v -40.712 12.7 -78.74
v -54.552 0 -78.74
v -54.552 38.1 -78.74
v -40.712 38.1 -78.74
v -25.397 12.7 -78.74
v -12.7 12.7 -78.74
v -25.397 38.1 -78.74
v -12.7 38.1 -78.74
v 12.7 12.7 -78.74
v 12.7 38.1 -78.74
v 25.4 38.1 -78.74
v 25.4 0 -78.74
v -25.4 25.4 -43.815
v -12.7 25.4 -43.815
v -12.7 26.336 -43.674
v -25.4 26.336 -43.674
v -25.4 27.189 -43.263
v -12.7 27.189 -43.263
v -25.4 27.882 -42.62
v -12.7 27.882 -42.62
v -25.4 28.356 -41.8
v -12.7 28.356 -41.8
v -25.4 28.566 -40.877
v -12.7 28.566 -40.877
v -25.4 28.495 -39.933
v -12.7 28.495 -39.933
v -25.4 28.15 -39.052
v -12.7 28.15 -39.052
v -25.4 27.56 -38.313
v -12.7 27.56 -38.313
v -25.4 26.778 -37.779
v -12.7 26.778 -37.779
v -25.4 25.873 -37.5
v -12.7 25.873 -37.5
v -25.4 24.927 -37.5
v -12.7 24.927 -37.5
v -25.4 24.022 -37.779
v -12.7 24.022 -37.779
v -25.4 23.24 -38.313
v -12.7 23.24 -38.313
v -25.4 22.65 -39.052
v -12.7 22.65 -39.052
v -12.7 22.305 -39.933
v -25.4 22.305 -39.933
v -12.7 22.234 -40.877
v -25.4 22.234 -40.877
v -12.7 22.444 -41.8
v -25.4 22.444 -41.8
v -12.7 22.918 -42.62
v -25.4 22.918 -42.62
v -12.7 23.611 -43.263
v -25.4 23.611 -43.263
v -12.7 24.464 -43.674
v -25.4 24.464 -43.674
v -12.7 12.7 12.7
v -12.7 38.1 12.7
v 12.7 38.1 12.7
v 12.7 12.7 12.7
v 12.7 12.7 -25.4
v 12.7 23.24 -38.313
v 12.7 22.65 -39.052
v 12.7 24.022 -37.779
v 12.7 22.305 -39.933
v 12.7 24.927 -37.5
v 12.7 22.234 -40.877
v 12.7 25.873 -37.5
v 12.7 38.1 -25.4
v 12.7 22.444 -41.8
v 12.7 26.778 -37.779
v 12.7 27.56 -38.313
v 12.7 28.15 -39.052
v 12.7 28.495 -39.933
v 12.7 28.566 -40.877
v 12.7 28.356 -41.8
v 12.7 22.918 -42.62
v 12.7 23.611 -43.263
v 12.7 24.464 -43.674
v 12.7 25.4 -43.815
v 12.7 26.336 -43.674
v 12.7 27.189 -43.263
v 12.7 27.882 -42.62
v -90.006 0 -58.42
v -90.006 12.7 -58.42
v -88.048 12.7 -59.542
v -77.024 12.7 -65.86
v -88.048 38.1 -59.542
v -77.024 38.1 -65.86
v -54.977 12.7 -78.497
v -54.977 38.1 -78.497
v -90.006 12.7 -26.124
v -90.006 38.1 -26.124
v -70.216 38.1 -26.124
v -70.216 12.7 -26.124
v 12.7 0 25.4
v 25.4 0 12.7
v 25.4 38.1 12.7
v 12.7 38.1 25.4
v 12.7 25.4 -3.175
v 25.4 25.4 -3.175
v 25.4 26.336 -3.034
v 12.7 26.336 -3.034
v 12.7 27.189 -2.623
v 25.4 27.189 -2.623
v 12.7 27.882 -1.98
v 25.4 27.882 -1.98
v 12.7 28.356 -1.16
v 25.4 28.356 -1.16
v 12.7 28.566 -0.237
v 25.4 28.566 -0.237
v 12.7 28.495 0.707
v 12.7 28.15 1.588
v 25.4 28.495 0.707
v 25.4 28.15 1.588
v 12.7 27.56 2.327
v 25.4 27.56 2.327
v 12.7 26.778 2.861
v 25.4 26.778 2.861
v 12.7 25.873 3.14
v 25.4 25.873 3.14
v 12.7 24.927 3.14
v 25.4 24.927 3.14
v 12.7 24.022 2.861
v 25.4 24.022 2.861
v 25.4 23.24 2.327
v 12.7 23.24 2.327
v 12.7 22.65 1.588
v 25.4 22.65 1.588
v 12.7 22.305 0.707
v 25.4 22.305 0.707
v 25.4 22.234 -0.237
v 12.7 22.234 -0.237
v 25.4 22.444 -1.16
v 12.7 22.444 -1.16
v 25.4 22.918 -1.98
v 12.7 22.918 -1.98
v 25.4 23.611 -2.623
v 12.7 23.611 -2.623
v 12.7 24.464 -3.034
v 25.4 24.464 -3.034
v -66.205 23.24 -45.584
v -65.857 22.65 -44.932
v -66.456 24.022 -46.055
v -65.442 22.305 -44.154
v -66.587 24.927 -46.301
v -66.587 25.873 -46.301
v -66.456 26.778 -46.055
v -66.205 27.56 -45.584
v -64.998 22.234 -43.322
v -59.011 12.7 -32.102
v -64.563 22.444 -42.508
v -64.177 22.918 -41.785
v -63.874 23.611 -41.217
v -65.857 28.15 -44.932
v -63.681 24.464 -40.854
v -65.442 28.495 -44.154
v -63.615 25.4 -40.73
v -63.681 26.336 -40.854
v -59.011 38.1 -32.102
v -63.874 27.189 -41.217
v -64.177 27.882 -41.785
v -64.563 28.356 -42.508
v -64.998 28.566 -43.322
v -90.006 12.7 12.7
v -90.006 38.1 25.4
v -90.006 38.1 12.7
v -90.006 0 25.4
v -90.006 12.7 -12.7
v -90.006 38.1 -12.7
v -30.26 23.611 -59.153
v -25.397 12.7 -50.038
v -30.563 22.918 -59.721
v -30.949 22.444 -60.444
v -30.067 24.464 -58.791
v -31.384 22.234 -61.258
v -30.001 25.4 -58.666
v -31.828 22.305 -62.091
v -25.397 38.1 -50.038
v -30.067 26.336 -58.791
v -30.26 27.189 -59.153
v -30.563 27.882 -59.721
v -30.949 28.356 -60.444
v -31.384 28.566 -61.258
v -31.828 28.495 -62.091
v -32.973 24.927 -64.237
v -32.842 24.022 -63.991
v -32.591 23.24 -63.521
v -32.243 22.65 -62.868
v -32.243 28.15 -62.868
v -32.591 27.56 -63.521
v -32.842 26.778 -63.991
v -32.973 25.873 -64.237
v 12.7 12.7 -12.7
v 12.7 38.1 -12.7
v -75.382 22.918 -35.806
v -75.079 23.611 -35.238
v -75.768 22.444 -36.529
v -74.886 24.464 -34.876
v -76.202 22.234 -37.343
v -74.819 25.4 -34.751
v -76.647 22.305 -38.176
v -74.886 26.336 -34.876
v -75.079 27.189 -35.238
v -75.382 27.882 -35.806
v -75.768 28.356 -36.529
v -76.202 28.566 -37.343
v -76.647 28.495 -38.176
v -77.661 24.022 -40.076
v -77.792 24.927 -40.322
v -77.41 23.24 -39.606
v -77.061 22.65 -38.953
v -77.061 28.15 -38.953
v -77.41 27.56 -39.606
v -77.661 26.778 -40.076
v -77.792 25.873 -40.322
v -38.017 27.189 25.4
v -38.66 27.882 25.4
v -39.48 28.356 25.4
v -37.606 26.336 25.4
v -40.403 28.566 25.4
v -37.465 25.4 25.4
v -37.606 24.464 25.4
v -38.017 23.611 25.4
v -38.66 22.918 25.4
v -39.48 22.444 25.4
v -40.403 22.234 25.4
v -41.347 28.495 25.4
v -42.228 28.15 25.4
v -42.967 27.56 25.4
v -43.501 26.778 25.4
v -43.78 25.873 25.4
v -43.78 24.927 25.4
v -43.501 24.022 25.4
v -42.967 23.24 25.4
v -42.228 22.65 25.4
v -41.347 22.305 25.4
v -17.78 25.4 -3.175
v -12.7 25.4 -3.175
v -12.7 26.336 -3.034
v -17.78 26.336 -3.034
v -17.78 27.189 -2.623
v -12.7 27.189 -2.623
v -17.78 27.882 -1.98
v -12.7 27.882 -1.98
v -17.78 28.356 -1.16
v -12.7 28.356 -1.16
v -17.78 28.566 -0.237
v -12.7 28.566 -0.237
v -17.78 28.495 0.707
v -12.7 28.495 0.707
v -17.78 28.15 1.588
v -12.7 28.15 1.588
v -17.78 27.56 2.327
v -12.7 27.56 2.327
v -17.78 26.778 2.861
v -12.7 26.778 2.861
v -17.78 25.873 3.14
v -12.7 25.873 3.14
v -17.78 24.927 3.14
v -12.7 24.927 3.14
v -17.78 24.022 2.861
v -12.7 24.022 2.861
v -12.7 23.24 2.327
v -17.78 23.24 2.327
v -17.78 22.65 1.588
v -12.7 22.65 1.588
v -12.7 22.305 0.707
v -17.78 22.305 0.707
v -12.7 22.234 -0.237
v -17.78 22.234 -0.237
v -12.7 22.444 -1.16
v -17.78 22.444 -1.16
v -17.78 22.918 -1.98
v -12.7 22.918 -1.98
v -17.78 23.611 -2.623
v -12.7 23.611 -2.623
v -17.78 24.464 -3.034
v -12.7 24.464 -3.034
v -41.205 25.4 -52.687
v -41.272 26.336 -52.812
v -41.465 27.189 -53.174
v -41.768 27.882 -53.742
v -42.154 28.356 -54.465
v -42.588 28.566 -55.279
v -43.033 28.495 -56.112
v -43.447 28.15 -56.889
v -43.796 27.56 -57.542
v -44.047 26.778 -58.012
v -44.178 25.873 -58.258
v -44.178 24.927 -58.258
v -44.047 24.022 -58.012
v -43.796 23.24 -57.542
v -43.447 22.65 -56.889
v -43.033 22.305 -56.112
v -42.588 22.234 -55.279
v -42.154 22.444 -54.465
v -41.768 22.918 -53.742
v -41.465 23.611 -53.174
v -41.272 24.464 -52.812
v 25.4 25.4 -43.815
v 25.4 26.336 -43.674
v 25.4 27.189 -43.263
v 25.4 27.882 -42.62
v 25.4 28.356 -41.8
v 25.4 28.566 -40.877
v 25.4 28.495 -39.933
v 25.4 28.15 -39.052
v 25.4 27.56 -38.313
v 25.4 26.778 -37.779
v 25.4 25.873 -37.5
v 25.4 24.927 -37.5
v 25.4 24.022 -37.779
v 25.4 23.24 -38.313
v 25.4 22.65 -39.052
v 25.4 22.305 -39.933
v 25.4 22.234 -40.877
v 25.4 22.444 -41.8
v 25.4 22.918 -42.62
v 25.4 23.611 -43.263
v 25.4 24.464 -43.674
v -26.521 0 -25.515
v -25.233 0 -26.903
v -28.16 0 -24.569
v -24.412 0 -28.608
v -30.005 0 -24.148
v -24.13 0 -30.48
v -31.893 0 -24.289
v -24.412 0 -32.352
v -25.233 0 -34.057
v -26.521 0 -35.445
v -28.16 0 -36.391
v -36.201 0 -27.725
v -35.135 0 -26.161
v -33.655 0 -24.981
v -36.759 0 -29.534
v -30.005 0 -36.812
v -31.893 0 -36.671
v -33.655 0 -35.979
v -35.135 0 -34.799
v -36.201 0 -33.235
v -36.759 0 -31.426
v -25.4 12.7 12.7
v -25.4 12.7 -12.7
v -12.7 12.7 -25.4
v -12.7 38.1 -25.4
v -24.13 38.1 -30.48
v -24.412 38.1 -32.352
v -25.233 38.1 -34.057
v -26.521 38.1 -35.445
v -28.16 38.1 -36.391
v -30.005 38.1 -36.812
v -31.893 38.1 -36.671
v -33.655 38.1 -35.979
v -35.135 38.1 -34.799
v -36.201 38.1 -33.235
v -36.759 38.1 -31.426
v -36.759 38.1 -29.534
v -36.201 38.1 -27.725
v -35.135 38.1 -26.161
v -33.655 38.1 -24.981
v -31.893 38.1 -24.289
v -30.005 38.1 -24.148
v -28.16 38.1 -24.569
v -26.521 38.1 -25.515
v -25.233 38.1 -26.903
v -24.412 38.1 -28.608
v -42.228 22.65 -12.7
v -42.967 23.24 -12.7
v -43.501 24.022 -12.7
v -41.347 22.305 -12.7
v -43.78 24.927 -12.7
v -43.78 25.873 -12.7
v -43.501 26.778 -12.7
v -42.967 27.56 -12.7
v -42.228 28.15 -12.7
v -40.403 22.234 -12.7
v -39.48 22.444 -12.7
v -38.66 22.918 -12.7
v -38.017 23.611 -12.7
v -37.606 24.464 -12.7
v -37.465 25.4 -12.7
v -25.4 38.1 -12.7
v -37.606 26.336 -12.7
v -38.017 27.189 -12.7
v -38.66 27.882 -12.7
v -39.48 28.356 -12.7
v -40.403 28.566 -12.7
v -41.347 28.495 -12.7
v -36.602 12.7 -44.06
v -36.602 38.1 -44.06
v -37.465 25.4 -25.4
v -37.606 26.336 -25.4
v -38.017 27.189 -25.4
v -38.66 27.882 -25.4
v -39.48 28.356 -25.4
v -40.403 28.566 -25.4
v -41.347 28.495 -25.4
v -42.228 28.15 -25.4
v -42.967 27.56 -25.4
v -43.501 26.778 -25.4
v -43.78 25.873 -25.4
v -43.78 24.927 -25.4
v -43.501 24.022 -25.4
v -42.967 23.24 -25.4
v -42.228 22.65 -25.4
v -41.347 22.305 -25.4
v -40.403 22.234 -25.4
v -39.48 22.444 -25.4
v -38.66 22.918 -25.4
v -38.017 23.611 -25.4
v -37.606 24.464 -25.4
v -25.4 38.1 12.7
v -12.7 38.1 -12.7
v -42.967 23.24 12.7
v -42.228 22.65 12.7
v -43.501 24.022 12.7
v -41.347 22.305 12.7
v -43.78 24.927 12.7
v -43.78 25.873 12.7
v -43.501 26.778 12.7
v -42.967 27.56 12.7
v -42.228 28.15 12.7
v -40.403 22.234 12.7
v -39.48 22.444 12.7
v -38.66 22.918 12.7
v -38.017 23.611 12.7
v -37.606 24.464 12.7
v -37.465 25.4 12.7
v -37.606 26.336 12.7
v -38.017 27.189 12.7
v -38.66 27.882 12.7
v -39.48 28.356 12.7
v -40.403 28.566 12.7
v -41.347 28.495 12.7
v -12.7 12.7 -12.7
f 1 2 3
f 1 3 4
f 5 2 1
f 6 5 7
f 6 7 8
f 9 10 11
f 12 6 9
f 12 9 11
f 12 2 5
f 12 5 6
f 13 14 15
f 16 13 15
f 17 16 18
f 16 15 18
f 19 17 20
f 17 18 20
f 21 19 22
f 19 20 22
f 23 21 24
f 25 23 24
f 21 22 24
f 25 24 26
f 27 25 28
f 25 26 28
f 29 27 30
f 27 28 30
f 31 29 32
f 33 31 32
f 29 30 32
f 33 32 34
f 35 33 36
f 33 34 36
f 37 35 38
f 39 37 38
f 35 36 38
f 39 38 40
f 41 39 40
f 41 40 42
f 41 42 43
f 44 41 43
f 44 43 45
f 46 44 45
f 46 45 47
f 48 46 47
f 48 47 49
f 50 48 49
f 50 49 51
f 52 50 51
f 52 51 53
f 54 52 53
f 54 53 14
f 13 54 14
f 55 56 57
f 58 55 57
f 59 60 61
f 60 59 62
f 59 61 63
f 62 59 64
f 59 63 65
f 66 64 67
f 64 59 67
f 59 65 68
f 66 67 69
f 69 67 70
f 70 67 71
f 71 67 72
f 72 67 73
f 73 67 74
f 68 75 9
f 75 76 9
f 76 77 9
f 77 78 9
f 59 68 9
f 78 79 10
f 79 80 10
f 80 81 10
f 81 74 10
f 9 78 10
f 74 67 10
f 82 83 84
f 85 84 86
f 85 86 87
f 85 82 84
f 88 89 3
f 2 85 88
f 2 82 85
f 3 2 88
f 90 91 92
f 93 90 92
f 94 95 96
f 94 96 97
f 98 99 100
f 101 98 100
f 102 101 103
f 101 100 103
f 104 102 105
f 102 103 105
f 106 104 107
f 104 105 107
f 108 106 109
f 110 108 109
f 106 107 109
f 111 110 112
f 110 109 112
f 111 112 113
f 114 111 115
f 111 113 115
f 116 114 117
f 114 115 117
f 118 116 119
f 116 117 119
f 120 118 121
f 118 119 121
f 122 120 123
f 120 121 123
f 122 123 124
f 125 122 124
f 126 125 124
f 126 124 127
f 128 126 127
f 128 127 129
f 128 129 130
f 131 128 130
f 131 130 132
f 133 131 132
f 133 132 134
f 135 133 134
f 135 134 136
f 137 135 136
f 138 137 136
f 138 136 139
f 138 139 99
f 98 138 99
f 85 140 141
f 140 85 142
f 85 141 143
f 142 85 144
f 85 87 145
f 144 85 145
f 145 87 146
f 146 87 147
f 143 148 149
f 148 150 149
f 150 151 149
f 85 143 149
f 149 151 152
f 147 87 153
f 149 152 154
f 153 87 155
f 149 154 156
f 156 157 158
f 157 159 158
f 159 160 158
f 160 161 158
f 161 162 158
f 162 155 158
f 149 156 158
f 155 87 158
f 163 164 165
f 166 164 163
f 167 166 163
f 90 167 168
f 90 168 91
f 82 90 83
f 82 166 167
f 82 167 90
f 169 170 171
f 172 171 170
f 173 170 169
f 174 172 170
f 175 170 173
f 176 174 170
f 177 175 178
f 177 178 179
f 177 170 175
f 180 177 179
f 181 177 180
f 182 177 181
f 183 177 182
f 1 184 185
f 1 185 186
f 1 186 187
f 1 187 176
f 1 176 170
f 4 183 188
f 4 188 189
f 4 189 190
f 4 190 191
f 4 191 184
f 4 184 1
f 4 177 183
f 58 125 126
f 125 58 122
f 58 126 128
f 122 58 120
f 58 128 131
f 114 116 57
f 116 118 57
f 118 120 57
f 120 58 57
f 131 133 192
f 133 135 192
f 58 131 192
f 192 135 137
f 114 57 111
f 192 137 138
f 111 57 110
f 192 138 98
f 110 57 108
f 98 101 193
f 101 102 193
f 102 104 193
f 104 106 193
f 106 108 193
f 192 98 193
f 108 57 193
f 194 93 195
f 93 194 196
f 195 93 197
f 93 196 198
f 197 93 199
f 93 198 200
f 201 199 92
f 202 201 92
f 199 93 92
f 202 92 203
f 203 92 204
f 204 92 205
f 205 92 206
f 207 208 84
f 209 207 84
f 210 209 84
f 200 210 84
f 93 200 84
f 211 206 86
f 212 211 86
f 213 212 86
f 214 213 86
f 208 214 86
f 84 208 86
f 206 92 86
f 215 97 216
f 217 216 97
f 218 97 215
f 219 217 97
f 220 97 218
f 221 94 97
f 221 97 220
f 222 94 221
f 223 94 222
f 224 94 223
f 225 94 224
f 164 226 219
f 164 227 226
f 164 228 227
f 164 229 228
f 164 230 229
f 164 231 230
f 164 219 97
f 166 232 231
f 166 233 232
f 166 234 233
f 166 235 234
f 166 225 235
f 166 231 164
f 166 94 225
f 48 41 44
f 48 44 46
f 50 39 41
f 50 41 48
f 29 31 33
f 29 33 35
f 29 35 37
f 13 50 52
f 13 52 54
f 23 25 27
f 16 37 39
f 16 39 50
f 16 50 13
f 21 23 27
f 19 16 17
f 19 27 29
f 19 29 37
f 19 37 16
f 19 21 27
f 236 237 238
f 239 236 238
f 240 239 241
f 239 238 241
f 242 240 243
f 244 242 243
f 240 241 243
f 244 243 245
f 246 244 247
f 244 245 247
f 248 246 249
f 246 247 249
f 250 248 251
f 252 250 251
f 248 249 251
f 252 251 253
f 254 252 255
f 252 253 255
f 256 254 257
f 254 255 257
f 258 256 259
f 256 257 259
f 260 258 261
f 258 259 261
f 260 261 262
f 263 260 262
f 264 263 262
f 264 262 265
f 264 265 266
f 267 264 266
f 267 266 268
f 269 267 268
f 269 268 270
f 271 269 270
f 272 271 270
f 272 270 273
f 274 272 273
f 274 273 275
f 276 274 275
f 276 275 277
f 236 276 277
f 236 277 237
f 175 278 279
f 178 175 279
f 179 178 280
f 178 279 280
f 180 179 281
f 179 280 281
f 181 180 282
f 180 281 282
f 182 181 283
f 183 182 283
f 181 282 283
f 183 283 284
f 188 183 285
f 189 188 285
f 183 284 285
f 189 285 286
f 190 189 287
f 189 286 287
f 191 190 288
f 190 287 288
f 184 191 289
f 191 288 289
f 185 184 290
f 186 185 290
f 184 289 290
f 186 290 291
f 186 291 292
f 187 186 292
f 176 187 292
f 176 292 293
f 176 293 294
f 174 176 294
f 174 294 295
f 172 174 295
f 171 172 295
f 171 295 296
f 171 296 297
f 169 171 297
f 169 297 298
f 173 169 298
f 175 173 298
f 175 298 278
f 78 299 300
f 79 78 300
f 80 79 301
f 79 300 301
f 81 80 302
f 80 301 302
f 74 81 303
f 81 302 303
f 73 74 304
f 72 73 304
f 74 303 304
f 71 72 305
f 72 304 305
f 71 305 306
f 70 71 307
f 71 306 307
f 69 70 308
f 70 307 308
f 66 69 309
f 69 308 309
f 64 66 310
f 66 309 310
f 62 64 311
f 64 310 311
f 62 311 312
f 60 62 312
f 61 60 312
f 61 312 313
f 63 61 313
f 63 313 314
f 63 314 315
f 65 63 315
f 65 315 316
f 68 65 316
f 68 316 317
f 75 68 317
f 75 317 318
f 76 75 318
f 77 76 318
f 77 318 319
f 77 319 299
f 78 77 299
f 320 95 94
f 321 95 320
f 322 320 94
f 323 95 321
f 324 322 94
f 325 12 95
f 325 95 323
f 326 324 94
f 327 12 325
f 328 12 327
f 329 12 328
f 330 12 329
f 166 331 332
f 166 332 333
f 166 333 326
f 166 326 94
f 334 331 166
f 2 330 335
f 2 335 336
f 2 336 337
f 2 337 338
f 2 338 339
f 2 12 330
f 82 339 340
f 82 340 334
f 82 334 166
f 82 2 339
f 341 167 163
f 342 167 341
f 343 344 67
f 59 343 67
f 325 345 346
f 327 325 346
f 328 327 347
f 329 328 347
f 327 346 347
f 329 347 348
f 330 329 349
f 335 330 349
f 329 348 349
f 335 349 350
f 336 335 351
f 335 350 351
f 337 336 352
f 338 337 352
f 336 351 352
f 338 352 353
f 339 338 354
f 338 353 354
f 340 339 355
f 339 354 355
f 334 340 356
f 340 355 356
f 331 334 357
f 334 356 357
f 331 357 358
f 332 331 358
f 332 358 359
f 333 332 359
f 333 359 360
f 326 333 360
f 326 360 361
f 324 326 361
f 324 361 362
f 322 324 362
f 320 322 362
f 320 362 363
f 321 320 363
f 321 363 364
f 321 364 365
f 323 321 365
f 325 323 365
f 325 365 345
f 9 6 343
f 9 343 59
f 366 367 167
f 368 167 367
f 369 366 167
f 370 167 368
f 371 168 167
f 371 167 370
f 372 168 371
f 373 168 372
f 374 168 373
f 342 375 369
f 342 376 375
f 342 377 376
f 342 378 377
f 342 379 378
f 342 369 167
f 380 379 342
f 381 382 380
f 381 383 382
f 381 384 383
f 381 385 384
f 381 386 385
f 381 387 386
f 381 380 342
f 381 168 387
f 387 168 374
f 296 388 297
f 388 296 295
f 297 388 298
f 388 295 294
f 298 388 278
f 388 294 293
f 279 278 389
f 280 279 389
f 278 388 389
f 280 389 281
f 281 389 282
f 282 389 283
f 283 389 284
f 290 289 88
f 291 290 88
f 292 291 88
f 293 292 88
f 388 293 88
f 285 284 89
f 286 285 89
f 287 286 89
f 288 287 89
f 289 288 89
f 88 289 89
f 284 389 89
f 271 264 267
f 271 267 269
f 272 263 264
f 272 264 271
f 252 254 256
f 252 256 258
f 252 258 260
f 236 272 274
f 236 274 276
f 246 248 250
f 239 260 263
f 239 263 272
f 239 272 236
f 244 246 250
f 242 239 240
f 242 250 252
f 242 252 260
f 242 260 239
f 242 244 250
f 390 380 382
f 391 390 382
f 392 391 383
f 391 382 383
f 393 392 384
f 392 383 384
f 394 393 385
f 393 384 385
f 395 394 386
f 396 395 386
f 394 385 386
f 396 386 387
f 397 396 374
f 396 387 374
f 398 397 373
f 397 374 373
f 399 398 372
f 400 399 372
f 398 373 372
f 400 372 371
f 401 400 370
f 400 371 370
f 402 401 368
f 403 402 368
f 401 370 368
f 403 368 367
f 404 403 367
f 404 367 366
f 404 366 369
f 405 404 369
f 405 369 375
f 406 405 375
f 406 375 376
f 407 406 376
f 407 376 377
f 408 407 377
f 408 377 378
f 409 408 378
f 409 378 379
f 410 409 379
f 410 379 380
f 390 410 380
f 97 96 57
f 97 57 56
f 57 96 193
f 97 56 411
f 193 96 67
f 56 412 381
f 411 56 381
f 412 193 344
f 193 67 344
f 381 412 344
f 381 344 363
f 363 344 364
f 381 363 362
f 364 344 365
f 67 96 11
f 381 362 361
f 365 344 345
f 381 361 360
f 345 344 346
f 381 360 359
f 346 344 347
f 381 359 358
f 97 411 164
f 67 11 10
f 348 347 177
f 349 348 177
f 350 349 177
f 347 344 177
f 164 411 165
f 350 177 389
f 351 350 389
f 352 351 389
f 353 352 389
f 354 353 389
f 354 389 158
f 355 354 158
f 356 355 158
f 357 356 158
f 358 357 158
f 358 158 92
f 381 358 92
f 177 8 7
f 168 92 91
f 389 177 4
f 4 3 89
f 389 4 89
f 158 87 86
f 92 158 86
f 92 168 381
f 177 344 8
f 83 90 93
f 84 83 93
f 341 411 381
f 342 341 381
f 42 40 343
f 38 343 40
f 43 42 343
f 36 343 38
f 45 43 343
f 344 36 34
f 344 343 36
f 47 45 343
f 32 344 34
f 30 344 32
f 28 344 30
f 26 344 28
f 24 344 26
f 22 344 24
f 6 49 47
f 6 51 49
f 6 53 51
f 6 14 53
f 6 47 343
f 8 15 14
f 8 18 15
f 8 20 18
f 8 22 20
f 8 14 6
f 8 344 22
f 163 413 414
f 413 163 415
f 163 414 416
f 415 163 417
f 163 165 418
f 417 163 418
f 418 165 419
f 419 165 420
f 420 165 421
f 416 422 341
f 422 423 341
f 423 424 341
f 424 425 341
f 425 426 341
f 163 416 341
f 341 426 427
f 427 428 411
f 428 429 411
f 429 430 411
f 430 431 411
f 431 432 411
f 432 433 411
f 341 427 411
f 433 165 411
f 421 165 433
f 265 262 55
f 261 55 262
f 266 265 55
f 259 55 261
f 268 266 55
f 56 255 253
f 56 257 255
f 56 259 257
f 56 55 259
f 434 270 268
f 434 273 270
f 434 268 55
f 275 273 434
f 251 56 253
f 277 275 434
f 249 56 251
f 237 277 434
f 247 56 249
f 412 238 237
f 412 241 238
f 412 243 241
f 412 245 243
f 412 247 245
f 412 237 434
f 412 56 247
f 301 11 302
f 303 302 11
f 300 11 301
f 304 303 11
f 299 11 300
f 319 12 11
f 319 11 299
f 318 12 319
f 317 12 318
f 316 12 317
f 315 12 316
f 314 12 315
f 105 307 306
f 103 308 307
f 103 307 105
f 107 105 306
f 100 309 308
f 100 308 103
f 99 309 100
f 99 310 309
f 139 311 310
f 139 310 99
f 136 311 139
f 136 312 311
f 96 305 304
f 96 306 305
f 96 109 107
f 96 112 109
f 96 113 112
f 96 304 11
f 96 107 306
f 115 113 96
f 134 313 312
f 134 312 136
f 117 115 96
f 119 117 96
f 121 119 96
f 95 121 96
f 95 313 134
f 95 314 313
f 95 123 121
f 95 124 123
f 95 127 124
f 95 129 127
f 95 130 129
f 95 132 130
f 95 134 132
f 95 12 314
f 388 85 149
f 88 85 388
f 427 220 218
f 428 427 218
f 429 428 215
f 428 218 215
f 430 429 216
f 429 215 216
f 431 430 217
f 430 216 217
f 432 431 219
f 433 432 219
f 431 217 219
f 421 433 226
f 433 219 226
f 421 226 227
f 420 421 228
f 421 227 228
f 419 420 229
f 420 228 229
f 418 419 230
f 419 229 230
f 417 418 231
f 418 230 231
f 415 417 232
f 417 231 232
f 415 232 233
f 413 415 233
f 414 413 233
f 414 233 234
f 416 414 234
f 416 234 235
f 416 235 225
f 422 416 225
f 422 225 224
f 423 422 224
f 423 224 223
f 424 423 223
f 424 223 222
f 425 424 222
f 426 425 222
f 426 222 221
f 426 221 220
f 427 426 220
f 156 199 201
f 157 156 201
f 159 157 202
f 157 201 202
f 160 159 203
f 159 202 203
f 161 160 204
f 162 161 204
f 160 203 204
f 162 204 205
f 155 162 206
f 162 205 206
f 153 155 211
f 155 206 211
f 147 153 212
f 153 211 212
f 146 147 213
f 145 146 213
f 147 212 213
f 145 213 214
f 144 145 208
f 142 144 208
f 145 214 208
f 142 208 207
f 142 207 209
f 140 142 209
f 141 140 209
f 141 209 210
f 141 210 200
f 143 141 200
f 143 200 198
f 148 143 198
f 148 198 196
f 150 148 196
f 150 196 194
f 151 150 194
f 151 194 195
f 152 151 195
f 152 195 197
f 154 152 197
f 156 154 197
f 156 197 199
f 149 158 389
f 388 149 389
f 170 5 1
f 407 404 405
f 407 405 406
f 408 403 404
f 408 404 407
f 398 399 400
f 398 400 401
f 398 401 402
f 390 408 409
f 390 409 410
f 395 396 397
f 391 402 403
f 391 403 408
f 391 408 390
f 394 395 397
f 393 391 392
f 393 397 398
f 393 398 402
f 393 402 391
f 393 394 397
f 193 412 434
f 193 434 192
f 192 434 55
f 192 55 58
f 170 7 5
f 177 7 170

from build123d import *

# Parameters (mm, degrees)
SALIENTE_EXTRUIR1_DEPTH = 38.1
CROQUIS2_W              = 25.4
CROQUIS2_H              = 25.4
CORTAR_EXTRUIR1_DEPTH   = 25.4
CROQUIS3_W              = 64.605839452
CROQUIS3_H              = 25.4
CORTAR_EXTRUIR2_DEPTH   = 25.4
CROQUIS4_W              = 25.4
CROQUIS4_H              = 53.34
CORTAR_EXTRUIR3_DEPTH   = 25.4
CORTAR_EXTRUIR4_DEPTH   = 25.4
CORTAR_EXTRUIR5_DEPTH   = 25.4
CROQUIS7_R              = 3.175
CORTAR_EXTRUIR6_DEPTH   = 50.8
CROQUIS8_R              = 3.175
CORTAR_EXTRUIR7_DEPTH   = 50.8
CROQUIS10_R             = 3.175
CORTAR_EXTRUIR9_DEPTH   = 43.18
CROQUIS11_R             = 3.175
CORTAR_EXTRUIR10_DEPTH  = 50.8
SKETCH1_R               = 6.35
CUT_EXTRUDE1_DEPTH      = 39.1


with BuildPart() as part:
    # Croquis1 → Saliente-Extruir1 (new body)
    with BuildSketch(Plane(origin=(0, 0, 0), x_dir=(1, 0, 0), z_dir=(0, 1, 0))):
        Polygon((25.4, 78.74), (25.4, -12.7), (12.7, -25.4), (-90.005839452, -25.4), (-90.005839452, 58.42), (-54.552420926, 78.74), align=None)
    extrude(amount=SALIENTE_EXTRUIR1_DEPTH)

    # Croquis2 → Cortar-Extruir1 (cut)
    with BuildSketch(Plane(origin=(0, 38.1, 0), x_dir=(1, 0, 0), z_dir=(0, 1, 0))):
        Rectangle(CROQUIS2_W, CROQUIS2_H)
    extrude(amount=-CORTAR_EXTRUIR1_DEPTH, mode=Mode.SUBTRACT)

    # Croquis3 → Cortar-Extruir2 (cut)
    with BuildSketch(Plane(origin=(0, 38.1, 0), x_dir=(1, 0, 0), z_dir=(0, 1, 0))):
        with Locations((-57.702919726, 0)):
            Rectangle(CROQUIS3_W, CROQUIS3_H)
    extrude(amount=-CORTAR_EXTRUIR2_DEPTH, mode=Mode.SUBTRACT)

    # Croquis4 → Cortar-Extruir3 (cut)
    with BuildSketch(Plane(origin=(0, 38.1, 0), x_dir=(1, 0, 0), z_dir=(0, 1, 0))):
        with Locations((0, 52.07)):
            Rectangle(CROQUIS4_W, CROQUIS4_H)
    extrude(amount=-CORTAR_EXTRUIR3_DEPTH, mode=Mode.SUBTRACT)

    # Croquis5 → Cortar-Extruir4 (cut)
    with BuildSketch(Plane(origin=(0, 38.1, 0), x_dir=(1, 0, 0), z_dir=(0, 1, 0))):
        Polygon((-59.011096598, 32.102249098), (-36.601753481, 44.059729647), (-54.977056362, 78.496621719), (-77.024213035, 65.860372741), align=None)
    extrude(amount=-CORTAR_EXTRUIR4_DEPTH, mode=Mode.SUBTRACT)

    # Croquis6 → Cortar-Extruir5 (cut)
    with BuildSketch(Plane(origin=(0, 38.1, 0), x_dir=(1, 0, 0), z_dir=(0, 1, 0))):
        Polygon((-25.397081923, 50.038469922), (-40.712032739, 78.74), (-25.397081923, 78.74), align=None)
        Polygon((-70.215768156, 26.123508824), (-88.047791372, 59.542248253), (-90.005839452, 58.42), (-90.005839452, 26.123508824), align=None)
    extrude(amount=-CORTAR_EXTRUIR5_DEPTH, mode=Mode.SUBTRACT)

    # Croquis7 → Cortar-Extruir6 (cut)
    with BuildSketch(Plane.XY.offset(25.4)):
        with Locations((-40.64, 25.4)):
            Circle(CROQUIS7_R)
    extrude(amount=-CORTAR_EXTRUIR6_DEPTH, mode=Mode.SUBTRACT)

    # Croquis8 → Cortar-Extruir7 (cut)
    with BuildSketch(Plane(origin=(25.4, 0, 0), x_dir=(0, 0, -1), z_dir=(1, 0, 0))):
        with Locations((40.64, 25.4)):
            Circle(CROQUIS8_R)
    extrude(amount=-CORTAR_EXTRUIR7_DEPTH, mode=Mode.SUBTRACT)

    # Croquis10 → Cortar-Extruir9 (cut)
    with BuildSketch(Plane(origin=(25.4, 0, 0), x_dir=(0, 0, -1), z_dir=(1, 0, 0))):
        with Locations((0, 25.4)):
            Circle(CROQUIS10_R)
    extrude(amount=-CORTAR_EXTRUIR9_DEPTH, mode=Mode.SUBTRACT)

    # Croquis11 → Cortar-Extruir10 (cut)
    with BuildSketch(Plane(origin=(-43.804364121, 0, 23.373725379), x_dir=(0.470766951, 0, 0.882257603), z_dir=(-0.882257603, 0, 0.470766951))):
        with Locations((-69.056927347, 25.4)):
            Circle(CROQUIS11_R)
    extrude(amount=-CORTAR_EXTRUIR10_DEPTH, mode=Mode.SUBTRACT)

    # Sketch1 → Cut-Extrude1 (cut, through all)
    with BuildSketch(Plane(origin=(0, 38.1, 0), x_dir=(1, 0, 0), z_dir=(0, 1, 0))):
        with Locations((-30.48, 30.48)):
            Circle(SKETCH1_R)
    extrude(amount=-CUT_EXTRUDE1_DEPTH, mode=Mode.SUBTRACT)


solid = part.part
